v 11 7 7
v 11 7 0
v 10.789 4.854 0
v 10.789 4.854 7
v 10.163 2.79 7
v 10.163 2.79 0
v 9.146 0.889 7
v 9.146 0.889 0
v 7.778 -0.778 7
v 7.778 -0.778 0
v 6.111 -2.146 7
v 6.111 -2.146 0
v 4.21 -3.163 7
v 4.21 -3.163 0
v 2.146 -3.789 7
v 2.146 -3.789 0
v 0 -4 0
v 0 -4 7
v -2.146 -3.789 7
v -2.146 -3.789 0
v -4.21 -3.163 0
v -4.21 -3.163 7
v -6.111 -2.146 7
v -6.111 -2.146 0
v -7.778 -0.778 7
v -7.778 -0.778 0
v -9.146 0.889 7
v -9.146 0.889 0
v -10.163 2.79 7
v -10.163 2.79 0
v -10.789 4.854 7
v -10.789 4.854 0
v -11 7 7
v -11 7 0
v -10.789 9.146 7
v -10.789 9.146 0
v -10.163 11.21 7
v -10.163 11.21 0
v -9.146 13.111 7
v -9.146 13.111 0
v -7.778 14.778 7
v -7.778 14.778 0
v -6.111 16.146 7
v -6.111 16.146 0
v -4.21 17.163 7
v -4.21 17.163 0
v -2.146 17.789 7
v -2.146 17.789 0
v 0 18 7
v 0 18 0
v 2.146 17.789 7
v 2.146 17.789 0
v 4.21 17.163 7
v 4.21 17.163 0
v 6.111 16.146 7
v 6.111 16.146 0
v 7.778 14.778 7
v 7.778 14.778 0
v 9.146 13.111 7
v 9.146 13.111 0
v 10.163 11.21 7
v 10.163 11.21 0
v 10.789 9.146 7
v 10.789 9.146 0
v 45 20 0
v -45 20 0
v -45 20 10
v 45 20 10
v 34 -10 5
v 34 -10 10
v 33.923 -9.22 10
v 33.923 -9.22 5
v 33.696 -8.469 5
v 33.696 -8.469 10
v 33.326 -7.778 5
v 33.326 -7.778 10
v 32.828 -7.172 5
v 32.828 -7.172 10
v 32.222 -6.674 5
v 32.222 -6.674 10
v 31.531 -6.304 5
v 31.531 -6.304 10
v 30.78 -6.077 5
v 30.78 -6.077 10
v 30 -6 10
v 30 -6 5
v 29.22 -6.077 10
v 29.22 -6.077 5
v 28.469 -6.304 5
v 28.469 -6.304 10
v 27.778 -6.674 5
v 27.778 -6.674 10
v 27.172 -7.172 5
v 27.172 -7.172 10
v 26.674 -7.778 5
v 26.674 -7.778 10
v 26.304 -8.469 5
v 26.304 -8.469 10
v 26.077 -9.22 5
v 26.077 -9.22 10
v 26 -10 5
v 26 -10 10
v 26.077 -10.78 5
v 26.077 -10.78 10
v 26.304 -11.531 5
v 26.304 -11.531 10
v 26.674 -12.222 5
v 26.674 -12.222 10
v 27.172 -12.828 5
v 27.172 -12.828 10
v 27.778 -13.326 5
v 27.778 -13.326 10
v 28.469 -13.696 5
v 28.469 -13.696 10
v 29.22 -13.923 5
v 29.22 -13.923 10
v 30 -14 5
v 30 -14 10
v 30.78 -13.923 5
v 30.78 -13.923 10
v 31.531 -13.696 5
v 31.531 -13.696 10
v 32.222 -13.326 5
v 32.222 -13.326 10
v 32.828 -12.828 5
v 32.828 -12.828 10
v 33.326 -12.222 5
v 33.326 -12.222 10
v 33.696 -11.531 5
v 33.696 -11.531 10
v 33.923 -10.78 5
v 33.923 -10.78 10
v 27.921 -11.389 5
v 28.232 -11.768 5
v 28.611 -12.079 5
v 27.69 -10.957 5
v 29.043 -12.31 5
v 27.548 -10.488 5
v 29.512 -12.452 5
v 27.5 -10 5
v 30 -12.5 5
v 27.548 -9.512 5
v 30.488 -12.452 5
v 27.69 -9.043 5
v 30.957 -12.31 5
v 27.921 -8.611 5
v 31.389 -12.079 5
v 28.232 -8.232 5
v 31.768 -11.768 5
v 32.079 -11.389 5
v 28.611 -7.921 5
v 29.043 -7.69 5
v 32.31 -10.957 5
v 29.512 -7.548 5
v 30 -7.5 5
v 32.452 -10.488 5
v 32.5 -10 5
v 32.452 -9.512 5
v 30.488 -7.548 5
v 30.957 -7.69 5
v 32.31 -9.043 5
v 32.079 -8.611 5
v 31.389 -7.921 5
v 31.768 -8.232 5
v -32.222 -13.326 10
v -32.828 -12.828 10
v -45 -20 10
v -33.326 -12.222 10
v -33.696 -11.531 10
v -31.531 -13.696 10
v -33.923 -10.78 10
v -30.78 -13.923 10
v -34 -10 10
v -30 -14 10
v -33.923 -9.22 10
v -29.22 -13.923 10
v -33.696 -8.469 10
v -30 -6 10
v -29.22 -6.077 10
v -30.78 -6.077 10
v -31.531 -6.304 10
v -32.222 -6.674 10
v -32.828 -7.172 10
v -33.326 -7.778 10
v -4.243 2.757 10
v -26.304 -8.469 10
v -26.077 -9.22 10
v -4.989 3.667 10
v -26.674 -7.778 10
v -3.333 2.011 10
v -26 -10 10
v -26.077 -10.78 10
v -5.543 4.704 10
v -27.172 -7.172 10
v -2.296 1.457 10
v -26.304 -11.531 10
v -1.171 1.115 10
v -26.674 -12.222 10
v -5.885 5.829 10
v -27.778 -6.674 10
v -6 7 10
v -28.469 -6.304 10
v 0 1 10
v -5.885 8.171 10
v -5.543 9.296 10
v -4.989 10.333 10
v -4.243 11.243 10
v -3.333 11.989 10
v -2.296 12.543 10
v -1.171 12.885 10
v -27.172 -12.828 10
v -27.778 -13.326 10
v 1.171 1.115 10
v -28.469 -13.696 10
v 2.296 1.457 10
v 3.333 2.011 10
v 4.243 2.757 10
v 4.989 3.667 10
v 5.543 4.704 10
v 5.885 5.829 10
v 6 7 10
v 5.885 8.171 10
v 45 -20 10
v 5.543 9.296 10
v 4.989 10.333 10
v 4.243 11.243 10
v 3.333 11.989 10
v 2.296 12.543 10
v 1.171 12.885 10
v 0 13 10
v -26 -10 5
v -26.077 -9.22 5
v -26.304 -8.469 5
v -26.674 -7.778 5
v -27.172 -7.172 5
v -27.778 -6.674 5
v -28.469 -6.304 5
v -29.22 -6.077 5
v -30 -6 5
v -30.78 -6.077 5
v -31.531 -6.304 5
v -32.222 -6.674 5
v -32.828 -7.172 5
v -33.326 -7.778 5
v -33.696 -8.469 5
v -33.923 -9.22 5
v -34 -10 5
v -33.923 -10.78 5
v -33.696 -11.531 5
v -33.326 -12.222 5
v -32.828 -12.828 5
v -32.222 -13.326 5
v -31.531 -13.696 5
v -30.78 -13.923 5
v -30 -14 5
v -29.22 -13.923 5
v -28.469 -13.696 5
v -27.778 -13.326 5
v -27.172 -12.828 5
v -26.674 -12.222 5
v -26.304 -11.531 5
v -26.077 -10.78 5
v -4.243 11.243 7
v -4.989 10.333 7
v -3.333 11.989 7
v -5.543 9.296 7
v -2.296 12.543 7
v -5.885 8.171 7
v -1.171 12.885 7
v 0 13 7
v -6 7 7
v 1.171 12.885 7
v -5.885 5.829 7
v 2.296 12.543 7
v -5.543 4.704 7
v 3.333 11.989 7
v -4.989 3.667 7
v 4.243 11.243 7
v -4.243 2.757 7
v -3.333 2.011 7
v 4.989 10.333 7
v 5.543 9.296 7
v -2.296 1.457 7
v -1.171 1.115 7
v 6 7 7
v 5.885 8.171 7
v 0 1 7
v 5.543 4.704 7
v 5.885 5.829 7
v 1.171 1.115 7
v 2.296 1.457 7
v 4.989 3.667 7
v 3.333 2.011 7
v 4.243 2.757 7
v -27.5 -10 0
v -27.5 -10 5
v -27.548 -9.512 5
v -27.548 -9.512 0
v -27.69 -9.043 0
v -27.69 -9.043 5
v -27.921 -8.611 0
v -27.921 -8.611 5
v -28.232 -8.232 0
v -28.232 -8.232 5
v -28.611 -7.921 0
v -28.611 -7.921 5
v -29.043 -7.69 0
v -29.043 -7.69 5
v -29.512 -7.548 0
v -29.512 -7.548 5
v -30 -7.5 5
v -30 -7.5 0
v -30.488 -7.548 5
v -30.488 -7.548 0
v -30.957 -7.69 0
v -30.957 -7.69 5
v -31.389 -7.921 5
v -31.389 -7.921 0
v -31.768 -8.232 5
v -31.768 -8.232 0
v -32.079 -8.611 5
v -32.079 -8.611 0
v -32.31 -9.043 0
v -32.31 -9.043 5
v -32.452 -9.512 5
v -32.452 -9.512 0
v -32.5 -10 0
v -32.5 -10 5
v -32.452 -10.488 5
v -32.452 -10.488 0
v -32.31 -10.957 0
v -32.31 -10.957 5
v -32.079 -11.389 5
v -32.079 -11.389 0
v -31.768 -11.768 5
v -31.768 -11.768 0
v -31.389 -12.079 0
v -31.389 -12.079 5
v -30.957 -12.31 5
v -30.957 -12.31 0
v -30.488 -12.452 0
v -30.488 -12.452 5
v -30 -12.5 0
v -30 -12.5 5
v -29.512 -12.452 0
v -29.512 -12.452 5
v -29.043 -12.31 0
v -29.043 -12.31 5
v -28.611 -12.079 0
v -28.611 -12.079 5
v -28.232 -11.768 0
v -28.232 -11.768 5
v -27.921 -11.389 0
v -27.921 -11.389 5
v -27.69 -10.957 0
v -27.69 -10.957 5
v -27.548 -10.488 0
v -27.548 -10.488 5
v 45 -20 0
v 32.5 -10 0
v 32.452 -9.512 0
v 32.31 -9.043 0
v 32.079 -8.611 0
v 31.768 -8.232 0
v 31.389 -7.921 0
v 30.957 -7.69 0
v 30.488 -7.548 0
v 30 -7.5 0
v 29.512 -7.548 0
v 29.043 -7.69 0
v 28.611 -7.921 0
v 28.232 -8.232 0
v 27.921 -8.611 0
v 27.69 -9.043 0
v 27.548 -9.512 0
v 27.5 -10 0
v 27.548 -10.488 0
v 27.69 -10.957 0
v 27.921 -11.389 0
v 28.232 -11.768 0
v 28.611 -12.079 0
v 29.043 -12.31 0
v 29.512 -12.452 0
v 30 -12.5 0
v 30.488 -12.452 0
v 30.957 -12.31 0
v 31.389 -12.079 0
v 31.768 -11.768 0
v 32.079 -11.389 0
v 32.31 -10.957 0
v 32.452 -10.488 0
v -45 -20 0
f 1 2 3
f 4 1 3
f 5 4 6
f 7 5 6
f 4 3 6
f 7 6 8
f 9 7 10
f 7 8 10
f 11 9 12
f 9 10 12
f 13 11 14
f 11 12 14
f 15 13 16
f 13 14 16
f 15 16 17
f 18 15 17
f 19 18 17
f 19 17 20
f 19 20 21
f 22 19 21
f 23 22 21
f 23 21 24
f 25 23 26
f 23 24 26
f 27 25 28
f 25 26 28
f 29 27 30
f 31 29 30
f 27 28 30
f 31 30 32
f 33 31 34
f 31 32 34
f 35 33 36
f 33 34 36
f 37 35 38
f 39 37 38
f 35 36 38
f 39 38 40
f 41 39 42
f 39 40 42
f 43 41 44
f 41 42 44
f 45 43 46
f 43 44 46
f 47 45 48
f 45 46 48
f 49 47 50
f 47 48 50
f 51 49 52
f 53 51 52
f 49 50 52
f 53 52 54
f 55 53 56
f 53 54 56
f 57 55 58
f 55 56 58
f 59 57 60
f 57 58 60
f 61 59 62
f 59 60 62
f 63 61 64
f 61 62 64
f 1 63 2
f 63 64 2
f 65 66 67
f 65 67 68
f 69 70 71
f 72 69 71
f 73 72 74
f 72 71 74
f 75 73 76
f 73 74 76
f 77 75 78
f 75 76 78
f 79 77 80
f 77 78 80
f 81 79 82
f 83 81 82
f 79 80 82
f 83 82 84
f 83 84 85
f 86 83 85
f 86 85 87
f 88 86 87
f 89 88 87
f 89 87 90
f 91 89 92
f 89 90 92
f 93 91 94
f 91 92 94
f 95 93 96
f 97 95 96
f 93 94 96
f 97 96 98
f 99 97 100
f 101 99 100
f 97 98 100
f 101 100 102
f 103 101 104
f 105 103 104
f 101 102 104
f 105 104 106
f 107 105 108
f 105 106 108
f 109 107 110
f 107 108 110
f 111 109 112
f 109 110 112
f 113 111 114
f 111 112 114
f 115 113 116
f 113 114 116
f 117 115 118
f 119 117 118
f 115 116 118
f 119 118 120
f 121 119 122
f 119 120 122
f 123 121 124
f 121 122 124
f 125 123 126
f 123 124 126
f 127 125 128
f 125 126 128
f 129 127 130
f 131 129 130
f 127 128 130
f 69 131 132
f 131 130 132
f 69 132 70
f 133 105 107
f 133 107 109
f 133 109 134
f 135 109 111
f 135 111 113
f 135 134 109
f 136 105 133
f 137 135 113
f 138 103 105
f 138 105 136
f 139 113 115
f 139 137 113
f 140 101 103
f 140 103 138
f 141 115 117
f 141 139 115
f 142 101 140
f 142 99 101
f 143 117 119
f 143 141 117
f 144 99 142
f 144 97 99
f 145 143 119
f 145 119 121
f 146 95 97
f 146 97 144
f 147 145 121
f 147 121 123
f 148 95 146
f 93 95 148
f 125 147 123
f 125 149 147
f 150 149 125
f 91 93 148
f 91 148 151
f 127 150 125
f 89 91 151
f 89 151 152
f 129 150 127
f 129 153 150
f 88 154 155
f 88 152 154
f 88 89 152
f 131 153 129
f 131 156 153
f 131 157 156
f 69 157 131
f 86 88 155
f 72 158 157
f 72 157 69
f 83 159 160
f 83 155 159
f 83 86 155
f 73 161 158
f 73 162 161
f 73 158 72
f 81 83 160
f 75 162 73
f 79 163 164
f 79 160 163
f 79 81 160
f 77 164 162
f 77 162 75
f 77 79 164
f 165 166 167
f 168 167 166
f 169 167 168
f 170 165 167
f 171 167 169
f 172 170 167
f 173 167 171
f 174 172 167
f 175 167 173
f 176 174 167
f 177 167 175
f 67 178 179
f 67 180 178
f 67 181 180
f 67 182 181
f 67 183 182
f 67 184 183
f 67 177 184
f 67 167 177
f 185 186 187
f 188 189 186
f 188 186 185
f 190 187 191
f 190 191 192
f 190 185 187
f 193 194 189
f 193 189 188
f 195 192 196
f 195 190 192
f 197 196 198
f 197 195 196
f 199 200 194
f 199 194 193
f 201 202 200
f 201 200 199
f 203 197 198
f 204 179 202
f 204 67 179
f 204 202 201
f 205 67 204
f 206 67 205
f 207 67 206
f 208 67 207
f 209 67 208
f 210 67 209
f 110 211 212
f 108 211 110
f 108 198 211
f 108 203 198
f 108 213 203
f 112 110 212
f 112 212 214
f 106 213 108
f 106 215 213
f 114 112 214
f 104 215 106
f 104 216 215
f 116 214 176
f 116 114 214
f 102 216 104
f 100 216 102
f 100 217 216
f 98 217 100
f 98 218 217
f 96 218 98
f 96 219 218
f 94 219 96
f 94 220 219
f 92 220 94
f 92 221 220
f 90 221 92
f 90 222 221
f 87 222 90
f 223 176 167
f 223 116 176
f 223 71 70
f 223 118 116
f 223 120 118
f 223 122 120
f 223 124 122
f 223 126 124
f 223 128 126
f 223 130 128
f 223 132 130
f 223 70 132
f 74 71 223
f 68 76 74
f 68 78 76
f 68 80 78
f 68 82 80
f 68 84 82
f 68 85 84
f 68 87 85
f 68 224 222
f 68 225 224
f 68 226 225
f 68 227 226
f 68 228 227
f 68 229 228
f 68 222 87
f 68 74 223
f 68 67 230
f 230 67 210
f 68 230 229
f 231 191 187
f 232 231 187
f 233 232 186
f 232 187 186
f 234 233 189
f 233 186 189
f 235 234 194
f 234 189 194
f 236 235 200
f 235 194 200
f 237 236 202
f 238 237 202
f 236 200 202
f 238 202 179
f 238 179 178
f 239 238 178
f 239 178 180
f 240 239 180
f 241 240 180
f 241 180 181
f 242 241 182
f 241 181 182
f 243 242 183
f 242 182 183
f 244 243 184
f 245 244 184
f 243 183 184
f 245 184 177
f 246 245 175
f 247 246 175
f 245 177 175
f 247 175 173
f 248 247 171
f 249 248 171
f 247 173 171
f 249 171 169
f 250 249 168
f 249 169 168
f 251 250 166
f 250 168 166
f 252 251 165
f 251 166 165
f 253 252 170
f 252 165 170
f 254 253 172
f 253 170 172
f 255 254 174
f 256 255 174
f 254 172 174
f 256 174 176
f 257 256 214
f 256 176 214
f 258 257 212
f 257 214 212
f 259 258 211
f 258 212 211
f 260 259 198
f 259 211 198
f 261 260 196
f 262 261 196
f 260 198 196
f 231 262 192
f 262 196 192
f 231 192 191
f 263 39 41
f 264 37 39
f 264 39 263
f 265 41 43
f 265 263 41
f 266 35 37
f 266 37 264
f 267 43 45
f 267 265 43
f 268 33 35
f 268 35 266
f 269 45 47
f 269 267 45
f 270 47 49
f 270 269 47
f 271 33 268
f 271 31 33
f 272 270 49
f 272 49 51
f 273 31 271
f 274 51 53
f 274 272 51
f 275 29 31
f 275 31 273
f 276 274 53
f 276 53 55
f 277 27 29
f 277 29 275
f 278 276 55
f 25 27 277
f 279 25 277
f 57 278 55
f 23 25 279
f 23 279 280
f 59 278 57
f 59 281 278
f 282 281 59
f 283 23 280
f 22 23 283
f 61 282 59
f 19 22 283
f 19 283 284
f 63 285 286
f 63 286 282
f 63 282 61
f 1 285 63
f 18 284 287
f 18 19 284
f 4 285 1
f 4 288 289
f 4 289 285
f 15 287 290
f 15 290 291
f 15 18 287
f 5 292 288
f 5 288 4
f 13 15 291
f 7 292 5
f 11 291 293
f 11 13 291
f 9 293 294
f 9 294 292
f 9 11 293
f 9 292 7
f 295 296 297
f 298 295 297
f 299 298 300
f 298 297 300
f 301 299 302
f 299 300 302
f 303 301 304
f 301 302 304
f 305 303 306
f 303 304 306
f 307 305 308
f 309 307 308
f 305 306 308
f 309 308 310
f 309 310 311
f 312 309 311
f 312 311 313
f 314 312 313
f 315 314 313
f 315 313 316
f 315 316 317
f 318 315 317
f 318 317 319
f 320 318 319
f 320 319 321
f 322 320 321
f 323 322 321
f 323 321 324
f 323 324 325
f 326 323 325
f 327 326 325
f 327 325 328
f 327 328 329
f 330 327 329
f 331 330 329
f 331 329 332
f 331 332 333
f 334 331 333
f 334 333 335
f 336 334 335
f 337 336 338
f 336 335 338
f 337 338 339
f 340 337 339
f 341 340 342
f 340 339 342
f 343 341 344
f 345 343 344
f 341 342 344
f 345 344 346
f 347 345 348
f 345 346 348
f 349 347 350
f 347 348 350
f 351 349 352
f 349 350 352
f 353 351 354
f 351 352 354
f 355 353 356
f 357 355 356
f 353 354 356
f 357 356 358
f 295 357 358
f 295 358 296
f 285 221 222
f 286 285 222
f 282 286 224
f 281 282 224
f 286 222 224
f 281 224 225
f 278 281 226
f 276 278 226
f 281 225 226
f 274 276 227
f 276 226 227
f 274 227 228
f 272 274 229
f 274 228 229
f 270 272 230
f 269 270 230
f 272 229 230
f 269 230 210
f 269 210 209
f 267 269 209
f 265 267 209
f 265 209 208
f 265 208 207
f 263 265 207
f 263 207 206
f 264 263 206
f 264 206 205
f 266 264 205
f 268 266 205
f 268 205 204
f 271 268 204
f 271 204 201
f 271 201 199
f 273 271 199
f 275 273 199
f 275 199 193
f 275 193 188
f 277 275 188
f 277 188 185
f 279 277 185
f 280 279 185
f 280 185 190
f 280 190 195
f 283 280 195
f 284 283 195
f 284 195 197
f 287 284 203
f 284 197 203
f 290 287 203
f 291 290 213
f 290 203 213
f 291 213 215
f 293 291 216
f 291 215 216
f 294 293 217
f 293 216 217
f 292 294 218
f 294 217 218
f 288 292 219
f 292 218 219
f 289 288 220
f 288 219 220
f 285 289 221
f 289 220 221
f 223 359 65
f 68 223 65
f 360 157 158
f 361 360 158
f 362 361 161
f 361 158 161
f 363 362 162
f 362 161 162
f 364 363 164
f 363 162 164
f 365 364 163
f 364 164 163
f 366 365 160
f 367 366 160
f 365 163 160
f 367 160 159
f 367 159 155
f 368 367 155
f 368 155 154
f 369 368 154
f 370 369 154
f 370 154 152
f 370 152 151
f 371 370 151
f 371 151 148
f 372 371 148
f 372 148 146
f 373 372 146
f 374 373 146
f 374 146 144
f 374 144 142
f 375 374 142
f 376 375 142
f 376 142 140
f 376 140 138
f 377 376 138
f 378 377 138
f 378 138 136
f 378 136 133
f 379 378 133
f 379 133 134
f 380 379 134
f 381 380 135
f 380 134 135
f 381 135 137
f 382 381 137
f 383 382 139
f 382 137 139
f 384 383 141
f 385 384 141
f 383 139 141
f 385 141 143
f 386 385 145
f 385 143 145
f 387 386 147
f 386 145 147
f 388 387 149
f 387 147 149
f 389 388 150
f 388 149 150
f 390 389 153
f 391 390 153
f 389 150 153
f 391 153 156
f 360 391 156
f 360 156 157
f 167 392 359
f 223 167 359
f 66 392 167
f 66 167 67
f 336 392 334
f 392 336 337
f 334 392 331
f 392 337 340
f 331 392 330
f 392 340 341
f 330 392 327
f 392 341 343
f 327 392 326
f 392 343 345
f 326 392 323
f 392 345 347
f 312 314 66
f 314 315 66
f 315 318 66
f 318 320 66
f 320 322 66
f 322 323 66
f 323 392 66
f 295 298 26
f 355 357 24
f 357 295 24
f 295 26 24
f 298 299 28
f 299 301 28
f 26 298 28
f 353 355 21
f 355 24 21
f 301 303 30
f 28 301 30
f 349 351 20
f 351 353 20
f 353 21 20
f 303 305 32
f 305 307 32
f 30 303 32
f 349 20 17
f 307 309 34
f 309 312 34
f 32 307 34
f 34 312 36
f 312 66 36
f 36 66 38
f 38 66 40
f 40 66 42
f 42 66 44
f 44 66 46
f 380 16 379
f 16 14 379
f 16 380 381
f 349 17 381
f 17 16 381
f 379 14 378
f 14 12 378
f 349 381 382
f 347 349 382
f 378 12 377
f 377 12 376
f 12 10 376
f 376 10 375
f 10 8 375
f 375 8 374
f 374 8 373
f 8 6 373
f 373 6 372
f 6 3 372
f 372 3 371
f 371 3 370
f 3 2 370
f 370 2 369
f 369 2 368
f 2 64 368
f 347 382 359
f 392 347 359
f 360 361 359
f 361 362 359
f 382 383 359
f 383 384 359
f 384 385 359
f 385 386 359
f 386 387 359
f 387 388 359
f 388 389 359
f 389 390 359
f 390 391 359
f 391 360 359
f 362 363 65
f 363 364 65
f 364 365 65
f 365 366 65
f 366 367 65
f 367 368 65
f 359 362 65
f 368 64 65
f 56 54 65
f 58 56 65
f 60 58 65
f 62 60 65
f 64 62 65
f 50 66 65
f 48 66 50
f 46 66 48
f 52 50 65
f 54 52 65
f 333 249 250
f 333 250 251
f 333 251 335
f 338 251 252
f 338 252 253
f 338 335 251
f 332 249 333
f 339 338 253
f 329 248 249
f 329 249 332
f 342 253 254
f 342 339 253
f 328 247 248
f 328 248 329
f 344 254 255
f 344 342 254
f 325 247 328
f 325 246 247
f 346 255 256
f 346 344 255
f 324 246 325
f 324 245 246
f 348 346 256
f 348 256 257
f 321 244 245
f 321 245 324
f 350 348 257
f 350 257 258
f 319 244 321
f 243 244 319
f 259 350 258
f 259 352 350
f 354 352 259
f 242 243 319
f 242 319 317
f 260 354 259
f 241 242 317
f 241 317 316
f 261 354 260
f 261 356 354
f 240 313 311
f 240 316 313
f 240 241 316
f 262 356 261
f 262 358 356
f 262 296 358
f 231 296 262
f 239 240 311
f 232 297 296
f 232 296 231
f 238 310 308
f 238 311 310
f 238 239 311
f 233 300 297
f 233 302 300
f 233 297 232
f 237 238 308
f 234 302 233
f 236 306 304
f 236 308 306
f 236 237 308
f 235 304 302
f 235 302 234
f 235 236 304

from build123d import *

# Parameters (mm, degrees)
SKETCH_W        = 90
SKETCH_H        = 40
PAD_DEPTH       = 10
SKETCH001_R     = 6
SKETCH001_R_2   = 2.5
POCKET_DEPTH    = 10.001
SKETCH002_R     = 4
POCKET001_DEPTH = 5
SKETCH004_R     = 11
POCKET003_DEPTH = 7


with BuildPart() as part:
    # Sketch → Pad (new body)
    with BuildSketch(Plane.XY):
        Rectangle(SKETCH_W, SKETCH_H)
    extrude(amount=PAD_DEPTH)

    # Sketch001 (on Face6 of Pad) → Pocket (cut, through all)
    with BuildSketch(Plane.XY.offset(10)):
        with Locations((0, 7)):
            Circle(SKETCH001_R)
        with Locations((-30, -10)):
            Circle(SKETCH001_R_2)
        with Locations((30, -10)):
            Circle(SKETCH001_R_2)
    extrude(amount=-POCKET_DEPTH, mode=Mode.SUBTRACT)

    # Sketch002 (on Face5 of Pocket) → Pocket001 (cut)
    with BuildSketch(Plane.XY.offset(10)):
        with Locations((30, -10)):
            Circle(SKETCH002_R)
        with Locations((0, 7)):
            Circle(SKETCH002_R)
        with Locations((-30, -10)):
            Circle(SKETCH002_R)
    extrude(amount=-POCKET001_DEPTH, mode=Mode.SUBTRACT)

    # Sketch004 (on Face4 of Pocket001) → Pocket003 (cut)
    with BuildSketch(Plane(origin=(0, 0, 0), x_dir=(1, 0, 0), z_dir=(0, 0, -1))):
        with Locations((0, -7)):
            Circle(SKETCH004_R)
    extrude(amount=-POCKET003_DEPTH, mode=Mode.SUBTRACT)


solid = part.part
